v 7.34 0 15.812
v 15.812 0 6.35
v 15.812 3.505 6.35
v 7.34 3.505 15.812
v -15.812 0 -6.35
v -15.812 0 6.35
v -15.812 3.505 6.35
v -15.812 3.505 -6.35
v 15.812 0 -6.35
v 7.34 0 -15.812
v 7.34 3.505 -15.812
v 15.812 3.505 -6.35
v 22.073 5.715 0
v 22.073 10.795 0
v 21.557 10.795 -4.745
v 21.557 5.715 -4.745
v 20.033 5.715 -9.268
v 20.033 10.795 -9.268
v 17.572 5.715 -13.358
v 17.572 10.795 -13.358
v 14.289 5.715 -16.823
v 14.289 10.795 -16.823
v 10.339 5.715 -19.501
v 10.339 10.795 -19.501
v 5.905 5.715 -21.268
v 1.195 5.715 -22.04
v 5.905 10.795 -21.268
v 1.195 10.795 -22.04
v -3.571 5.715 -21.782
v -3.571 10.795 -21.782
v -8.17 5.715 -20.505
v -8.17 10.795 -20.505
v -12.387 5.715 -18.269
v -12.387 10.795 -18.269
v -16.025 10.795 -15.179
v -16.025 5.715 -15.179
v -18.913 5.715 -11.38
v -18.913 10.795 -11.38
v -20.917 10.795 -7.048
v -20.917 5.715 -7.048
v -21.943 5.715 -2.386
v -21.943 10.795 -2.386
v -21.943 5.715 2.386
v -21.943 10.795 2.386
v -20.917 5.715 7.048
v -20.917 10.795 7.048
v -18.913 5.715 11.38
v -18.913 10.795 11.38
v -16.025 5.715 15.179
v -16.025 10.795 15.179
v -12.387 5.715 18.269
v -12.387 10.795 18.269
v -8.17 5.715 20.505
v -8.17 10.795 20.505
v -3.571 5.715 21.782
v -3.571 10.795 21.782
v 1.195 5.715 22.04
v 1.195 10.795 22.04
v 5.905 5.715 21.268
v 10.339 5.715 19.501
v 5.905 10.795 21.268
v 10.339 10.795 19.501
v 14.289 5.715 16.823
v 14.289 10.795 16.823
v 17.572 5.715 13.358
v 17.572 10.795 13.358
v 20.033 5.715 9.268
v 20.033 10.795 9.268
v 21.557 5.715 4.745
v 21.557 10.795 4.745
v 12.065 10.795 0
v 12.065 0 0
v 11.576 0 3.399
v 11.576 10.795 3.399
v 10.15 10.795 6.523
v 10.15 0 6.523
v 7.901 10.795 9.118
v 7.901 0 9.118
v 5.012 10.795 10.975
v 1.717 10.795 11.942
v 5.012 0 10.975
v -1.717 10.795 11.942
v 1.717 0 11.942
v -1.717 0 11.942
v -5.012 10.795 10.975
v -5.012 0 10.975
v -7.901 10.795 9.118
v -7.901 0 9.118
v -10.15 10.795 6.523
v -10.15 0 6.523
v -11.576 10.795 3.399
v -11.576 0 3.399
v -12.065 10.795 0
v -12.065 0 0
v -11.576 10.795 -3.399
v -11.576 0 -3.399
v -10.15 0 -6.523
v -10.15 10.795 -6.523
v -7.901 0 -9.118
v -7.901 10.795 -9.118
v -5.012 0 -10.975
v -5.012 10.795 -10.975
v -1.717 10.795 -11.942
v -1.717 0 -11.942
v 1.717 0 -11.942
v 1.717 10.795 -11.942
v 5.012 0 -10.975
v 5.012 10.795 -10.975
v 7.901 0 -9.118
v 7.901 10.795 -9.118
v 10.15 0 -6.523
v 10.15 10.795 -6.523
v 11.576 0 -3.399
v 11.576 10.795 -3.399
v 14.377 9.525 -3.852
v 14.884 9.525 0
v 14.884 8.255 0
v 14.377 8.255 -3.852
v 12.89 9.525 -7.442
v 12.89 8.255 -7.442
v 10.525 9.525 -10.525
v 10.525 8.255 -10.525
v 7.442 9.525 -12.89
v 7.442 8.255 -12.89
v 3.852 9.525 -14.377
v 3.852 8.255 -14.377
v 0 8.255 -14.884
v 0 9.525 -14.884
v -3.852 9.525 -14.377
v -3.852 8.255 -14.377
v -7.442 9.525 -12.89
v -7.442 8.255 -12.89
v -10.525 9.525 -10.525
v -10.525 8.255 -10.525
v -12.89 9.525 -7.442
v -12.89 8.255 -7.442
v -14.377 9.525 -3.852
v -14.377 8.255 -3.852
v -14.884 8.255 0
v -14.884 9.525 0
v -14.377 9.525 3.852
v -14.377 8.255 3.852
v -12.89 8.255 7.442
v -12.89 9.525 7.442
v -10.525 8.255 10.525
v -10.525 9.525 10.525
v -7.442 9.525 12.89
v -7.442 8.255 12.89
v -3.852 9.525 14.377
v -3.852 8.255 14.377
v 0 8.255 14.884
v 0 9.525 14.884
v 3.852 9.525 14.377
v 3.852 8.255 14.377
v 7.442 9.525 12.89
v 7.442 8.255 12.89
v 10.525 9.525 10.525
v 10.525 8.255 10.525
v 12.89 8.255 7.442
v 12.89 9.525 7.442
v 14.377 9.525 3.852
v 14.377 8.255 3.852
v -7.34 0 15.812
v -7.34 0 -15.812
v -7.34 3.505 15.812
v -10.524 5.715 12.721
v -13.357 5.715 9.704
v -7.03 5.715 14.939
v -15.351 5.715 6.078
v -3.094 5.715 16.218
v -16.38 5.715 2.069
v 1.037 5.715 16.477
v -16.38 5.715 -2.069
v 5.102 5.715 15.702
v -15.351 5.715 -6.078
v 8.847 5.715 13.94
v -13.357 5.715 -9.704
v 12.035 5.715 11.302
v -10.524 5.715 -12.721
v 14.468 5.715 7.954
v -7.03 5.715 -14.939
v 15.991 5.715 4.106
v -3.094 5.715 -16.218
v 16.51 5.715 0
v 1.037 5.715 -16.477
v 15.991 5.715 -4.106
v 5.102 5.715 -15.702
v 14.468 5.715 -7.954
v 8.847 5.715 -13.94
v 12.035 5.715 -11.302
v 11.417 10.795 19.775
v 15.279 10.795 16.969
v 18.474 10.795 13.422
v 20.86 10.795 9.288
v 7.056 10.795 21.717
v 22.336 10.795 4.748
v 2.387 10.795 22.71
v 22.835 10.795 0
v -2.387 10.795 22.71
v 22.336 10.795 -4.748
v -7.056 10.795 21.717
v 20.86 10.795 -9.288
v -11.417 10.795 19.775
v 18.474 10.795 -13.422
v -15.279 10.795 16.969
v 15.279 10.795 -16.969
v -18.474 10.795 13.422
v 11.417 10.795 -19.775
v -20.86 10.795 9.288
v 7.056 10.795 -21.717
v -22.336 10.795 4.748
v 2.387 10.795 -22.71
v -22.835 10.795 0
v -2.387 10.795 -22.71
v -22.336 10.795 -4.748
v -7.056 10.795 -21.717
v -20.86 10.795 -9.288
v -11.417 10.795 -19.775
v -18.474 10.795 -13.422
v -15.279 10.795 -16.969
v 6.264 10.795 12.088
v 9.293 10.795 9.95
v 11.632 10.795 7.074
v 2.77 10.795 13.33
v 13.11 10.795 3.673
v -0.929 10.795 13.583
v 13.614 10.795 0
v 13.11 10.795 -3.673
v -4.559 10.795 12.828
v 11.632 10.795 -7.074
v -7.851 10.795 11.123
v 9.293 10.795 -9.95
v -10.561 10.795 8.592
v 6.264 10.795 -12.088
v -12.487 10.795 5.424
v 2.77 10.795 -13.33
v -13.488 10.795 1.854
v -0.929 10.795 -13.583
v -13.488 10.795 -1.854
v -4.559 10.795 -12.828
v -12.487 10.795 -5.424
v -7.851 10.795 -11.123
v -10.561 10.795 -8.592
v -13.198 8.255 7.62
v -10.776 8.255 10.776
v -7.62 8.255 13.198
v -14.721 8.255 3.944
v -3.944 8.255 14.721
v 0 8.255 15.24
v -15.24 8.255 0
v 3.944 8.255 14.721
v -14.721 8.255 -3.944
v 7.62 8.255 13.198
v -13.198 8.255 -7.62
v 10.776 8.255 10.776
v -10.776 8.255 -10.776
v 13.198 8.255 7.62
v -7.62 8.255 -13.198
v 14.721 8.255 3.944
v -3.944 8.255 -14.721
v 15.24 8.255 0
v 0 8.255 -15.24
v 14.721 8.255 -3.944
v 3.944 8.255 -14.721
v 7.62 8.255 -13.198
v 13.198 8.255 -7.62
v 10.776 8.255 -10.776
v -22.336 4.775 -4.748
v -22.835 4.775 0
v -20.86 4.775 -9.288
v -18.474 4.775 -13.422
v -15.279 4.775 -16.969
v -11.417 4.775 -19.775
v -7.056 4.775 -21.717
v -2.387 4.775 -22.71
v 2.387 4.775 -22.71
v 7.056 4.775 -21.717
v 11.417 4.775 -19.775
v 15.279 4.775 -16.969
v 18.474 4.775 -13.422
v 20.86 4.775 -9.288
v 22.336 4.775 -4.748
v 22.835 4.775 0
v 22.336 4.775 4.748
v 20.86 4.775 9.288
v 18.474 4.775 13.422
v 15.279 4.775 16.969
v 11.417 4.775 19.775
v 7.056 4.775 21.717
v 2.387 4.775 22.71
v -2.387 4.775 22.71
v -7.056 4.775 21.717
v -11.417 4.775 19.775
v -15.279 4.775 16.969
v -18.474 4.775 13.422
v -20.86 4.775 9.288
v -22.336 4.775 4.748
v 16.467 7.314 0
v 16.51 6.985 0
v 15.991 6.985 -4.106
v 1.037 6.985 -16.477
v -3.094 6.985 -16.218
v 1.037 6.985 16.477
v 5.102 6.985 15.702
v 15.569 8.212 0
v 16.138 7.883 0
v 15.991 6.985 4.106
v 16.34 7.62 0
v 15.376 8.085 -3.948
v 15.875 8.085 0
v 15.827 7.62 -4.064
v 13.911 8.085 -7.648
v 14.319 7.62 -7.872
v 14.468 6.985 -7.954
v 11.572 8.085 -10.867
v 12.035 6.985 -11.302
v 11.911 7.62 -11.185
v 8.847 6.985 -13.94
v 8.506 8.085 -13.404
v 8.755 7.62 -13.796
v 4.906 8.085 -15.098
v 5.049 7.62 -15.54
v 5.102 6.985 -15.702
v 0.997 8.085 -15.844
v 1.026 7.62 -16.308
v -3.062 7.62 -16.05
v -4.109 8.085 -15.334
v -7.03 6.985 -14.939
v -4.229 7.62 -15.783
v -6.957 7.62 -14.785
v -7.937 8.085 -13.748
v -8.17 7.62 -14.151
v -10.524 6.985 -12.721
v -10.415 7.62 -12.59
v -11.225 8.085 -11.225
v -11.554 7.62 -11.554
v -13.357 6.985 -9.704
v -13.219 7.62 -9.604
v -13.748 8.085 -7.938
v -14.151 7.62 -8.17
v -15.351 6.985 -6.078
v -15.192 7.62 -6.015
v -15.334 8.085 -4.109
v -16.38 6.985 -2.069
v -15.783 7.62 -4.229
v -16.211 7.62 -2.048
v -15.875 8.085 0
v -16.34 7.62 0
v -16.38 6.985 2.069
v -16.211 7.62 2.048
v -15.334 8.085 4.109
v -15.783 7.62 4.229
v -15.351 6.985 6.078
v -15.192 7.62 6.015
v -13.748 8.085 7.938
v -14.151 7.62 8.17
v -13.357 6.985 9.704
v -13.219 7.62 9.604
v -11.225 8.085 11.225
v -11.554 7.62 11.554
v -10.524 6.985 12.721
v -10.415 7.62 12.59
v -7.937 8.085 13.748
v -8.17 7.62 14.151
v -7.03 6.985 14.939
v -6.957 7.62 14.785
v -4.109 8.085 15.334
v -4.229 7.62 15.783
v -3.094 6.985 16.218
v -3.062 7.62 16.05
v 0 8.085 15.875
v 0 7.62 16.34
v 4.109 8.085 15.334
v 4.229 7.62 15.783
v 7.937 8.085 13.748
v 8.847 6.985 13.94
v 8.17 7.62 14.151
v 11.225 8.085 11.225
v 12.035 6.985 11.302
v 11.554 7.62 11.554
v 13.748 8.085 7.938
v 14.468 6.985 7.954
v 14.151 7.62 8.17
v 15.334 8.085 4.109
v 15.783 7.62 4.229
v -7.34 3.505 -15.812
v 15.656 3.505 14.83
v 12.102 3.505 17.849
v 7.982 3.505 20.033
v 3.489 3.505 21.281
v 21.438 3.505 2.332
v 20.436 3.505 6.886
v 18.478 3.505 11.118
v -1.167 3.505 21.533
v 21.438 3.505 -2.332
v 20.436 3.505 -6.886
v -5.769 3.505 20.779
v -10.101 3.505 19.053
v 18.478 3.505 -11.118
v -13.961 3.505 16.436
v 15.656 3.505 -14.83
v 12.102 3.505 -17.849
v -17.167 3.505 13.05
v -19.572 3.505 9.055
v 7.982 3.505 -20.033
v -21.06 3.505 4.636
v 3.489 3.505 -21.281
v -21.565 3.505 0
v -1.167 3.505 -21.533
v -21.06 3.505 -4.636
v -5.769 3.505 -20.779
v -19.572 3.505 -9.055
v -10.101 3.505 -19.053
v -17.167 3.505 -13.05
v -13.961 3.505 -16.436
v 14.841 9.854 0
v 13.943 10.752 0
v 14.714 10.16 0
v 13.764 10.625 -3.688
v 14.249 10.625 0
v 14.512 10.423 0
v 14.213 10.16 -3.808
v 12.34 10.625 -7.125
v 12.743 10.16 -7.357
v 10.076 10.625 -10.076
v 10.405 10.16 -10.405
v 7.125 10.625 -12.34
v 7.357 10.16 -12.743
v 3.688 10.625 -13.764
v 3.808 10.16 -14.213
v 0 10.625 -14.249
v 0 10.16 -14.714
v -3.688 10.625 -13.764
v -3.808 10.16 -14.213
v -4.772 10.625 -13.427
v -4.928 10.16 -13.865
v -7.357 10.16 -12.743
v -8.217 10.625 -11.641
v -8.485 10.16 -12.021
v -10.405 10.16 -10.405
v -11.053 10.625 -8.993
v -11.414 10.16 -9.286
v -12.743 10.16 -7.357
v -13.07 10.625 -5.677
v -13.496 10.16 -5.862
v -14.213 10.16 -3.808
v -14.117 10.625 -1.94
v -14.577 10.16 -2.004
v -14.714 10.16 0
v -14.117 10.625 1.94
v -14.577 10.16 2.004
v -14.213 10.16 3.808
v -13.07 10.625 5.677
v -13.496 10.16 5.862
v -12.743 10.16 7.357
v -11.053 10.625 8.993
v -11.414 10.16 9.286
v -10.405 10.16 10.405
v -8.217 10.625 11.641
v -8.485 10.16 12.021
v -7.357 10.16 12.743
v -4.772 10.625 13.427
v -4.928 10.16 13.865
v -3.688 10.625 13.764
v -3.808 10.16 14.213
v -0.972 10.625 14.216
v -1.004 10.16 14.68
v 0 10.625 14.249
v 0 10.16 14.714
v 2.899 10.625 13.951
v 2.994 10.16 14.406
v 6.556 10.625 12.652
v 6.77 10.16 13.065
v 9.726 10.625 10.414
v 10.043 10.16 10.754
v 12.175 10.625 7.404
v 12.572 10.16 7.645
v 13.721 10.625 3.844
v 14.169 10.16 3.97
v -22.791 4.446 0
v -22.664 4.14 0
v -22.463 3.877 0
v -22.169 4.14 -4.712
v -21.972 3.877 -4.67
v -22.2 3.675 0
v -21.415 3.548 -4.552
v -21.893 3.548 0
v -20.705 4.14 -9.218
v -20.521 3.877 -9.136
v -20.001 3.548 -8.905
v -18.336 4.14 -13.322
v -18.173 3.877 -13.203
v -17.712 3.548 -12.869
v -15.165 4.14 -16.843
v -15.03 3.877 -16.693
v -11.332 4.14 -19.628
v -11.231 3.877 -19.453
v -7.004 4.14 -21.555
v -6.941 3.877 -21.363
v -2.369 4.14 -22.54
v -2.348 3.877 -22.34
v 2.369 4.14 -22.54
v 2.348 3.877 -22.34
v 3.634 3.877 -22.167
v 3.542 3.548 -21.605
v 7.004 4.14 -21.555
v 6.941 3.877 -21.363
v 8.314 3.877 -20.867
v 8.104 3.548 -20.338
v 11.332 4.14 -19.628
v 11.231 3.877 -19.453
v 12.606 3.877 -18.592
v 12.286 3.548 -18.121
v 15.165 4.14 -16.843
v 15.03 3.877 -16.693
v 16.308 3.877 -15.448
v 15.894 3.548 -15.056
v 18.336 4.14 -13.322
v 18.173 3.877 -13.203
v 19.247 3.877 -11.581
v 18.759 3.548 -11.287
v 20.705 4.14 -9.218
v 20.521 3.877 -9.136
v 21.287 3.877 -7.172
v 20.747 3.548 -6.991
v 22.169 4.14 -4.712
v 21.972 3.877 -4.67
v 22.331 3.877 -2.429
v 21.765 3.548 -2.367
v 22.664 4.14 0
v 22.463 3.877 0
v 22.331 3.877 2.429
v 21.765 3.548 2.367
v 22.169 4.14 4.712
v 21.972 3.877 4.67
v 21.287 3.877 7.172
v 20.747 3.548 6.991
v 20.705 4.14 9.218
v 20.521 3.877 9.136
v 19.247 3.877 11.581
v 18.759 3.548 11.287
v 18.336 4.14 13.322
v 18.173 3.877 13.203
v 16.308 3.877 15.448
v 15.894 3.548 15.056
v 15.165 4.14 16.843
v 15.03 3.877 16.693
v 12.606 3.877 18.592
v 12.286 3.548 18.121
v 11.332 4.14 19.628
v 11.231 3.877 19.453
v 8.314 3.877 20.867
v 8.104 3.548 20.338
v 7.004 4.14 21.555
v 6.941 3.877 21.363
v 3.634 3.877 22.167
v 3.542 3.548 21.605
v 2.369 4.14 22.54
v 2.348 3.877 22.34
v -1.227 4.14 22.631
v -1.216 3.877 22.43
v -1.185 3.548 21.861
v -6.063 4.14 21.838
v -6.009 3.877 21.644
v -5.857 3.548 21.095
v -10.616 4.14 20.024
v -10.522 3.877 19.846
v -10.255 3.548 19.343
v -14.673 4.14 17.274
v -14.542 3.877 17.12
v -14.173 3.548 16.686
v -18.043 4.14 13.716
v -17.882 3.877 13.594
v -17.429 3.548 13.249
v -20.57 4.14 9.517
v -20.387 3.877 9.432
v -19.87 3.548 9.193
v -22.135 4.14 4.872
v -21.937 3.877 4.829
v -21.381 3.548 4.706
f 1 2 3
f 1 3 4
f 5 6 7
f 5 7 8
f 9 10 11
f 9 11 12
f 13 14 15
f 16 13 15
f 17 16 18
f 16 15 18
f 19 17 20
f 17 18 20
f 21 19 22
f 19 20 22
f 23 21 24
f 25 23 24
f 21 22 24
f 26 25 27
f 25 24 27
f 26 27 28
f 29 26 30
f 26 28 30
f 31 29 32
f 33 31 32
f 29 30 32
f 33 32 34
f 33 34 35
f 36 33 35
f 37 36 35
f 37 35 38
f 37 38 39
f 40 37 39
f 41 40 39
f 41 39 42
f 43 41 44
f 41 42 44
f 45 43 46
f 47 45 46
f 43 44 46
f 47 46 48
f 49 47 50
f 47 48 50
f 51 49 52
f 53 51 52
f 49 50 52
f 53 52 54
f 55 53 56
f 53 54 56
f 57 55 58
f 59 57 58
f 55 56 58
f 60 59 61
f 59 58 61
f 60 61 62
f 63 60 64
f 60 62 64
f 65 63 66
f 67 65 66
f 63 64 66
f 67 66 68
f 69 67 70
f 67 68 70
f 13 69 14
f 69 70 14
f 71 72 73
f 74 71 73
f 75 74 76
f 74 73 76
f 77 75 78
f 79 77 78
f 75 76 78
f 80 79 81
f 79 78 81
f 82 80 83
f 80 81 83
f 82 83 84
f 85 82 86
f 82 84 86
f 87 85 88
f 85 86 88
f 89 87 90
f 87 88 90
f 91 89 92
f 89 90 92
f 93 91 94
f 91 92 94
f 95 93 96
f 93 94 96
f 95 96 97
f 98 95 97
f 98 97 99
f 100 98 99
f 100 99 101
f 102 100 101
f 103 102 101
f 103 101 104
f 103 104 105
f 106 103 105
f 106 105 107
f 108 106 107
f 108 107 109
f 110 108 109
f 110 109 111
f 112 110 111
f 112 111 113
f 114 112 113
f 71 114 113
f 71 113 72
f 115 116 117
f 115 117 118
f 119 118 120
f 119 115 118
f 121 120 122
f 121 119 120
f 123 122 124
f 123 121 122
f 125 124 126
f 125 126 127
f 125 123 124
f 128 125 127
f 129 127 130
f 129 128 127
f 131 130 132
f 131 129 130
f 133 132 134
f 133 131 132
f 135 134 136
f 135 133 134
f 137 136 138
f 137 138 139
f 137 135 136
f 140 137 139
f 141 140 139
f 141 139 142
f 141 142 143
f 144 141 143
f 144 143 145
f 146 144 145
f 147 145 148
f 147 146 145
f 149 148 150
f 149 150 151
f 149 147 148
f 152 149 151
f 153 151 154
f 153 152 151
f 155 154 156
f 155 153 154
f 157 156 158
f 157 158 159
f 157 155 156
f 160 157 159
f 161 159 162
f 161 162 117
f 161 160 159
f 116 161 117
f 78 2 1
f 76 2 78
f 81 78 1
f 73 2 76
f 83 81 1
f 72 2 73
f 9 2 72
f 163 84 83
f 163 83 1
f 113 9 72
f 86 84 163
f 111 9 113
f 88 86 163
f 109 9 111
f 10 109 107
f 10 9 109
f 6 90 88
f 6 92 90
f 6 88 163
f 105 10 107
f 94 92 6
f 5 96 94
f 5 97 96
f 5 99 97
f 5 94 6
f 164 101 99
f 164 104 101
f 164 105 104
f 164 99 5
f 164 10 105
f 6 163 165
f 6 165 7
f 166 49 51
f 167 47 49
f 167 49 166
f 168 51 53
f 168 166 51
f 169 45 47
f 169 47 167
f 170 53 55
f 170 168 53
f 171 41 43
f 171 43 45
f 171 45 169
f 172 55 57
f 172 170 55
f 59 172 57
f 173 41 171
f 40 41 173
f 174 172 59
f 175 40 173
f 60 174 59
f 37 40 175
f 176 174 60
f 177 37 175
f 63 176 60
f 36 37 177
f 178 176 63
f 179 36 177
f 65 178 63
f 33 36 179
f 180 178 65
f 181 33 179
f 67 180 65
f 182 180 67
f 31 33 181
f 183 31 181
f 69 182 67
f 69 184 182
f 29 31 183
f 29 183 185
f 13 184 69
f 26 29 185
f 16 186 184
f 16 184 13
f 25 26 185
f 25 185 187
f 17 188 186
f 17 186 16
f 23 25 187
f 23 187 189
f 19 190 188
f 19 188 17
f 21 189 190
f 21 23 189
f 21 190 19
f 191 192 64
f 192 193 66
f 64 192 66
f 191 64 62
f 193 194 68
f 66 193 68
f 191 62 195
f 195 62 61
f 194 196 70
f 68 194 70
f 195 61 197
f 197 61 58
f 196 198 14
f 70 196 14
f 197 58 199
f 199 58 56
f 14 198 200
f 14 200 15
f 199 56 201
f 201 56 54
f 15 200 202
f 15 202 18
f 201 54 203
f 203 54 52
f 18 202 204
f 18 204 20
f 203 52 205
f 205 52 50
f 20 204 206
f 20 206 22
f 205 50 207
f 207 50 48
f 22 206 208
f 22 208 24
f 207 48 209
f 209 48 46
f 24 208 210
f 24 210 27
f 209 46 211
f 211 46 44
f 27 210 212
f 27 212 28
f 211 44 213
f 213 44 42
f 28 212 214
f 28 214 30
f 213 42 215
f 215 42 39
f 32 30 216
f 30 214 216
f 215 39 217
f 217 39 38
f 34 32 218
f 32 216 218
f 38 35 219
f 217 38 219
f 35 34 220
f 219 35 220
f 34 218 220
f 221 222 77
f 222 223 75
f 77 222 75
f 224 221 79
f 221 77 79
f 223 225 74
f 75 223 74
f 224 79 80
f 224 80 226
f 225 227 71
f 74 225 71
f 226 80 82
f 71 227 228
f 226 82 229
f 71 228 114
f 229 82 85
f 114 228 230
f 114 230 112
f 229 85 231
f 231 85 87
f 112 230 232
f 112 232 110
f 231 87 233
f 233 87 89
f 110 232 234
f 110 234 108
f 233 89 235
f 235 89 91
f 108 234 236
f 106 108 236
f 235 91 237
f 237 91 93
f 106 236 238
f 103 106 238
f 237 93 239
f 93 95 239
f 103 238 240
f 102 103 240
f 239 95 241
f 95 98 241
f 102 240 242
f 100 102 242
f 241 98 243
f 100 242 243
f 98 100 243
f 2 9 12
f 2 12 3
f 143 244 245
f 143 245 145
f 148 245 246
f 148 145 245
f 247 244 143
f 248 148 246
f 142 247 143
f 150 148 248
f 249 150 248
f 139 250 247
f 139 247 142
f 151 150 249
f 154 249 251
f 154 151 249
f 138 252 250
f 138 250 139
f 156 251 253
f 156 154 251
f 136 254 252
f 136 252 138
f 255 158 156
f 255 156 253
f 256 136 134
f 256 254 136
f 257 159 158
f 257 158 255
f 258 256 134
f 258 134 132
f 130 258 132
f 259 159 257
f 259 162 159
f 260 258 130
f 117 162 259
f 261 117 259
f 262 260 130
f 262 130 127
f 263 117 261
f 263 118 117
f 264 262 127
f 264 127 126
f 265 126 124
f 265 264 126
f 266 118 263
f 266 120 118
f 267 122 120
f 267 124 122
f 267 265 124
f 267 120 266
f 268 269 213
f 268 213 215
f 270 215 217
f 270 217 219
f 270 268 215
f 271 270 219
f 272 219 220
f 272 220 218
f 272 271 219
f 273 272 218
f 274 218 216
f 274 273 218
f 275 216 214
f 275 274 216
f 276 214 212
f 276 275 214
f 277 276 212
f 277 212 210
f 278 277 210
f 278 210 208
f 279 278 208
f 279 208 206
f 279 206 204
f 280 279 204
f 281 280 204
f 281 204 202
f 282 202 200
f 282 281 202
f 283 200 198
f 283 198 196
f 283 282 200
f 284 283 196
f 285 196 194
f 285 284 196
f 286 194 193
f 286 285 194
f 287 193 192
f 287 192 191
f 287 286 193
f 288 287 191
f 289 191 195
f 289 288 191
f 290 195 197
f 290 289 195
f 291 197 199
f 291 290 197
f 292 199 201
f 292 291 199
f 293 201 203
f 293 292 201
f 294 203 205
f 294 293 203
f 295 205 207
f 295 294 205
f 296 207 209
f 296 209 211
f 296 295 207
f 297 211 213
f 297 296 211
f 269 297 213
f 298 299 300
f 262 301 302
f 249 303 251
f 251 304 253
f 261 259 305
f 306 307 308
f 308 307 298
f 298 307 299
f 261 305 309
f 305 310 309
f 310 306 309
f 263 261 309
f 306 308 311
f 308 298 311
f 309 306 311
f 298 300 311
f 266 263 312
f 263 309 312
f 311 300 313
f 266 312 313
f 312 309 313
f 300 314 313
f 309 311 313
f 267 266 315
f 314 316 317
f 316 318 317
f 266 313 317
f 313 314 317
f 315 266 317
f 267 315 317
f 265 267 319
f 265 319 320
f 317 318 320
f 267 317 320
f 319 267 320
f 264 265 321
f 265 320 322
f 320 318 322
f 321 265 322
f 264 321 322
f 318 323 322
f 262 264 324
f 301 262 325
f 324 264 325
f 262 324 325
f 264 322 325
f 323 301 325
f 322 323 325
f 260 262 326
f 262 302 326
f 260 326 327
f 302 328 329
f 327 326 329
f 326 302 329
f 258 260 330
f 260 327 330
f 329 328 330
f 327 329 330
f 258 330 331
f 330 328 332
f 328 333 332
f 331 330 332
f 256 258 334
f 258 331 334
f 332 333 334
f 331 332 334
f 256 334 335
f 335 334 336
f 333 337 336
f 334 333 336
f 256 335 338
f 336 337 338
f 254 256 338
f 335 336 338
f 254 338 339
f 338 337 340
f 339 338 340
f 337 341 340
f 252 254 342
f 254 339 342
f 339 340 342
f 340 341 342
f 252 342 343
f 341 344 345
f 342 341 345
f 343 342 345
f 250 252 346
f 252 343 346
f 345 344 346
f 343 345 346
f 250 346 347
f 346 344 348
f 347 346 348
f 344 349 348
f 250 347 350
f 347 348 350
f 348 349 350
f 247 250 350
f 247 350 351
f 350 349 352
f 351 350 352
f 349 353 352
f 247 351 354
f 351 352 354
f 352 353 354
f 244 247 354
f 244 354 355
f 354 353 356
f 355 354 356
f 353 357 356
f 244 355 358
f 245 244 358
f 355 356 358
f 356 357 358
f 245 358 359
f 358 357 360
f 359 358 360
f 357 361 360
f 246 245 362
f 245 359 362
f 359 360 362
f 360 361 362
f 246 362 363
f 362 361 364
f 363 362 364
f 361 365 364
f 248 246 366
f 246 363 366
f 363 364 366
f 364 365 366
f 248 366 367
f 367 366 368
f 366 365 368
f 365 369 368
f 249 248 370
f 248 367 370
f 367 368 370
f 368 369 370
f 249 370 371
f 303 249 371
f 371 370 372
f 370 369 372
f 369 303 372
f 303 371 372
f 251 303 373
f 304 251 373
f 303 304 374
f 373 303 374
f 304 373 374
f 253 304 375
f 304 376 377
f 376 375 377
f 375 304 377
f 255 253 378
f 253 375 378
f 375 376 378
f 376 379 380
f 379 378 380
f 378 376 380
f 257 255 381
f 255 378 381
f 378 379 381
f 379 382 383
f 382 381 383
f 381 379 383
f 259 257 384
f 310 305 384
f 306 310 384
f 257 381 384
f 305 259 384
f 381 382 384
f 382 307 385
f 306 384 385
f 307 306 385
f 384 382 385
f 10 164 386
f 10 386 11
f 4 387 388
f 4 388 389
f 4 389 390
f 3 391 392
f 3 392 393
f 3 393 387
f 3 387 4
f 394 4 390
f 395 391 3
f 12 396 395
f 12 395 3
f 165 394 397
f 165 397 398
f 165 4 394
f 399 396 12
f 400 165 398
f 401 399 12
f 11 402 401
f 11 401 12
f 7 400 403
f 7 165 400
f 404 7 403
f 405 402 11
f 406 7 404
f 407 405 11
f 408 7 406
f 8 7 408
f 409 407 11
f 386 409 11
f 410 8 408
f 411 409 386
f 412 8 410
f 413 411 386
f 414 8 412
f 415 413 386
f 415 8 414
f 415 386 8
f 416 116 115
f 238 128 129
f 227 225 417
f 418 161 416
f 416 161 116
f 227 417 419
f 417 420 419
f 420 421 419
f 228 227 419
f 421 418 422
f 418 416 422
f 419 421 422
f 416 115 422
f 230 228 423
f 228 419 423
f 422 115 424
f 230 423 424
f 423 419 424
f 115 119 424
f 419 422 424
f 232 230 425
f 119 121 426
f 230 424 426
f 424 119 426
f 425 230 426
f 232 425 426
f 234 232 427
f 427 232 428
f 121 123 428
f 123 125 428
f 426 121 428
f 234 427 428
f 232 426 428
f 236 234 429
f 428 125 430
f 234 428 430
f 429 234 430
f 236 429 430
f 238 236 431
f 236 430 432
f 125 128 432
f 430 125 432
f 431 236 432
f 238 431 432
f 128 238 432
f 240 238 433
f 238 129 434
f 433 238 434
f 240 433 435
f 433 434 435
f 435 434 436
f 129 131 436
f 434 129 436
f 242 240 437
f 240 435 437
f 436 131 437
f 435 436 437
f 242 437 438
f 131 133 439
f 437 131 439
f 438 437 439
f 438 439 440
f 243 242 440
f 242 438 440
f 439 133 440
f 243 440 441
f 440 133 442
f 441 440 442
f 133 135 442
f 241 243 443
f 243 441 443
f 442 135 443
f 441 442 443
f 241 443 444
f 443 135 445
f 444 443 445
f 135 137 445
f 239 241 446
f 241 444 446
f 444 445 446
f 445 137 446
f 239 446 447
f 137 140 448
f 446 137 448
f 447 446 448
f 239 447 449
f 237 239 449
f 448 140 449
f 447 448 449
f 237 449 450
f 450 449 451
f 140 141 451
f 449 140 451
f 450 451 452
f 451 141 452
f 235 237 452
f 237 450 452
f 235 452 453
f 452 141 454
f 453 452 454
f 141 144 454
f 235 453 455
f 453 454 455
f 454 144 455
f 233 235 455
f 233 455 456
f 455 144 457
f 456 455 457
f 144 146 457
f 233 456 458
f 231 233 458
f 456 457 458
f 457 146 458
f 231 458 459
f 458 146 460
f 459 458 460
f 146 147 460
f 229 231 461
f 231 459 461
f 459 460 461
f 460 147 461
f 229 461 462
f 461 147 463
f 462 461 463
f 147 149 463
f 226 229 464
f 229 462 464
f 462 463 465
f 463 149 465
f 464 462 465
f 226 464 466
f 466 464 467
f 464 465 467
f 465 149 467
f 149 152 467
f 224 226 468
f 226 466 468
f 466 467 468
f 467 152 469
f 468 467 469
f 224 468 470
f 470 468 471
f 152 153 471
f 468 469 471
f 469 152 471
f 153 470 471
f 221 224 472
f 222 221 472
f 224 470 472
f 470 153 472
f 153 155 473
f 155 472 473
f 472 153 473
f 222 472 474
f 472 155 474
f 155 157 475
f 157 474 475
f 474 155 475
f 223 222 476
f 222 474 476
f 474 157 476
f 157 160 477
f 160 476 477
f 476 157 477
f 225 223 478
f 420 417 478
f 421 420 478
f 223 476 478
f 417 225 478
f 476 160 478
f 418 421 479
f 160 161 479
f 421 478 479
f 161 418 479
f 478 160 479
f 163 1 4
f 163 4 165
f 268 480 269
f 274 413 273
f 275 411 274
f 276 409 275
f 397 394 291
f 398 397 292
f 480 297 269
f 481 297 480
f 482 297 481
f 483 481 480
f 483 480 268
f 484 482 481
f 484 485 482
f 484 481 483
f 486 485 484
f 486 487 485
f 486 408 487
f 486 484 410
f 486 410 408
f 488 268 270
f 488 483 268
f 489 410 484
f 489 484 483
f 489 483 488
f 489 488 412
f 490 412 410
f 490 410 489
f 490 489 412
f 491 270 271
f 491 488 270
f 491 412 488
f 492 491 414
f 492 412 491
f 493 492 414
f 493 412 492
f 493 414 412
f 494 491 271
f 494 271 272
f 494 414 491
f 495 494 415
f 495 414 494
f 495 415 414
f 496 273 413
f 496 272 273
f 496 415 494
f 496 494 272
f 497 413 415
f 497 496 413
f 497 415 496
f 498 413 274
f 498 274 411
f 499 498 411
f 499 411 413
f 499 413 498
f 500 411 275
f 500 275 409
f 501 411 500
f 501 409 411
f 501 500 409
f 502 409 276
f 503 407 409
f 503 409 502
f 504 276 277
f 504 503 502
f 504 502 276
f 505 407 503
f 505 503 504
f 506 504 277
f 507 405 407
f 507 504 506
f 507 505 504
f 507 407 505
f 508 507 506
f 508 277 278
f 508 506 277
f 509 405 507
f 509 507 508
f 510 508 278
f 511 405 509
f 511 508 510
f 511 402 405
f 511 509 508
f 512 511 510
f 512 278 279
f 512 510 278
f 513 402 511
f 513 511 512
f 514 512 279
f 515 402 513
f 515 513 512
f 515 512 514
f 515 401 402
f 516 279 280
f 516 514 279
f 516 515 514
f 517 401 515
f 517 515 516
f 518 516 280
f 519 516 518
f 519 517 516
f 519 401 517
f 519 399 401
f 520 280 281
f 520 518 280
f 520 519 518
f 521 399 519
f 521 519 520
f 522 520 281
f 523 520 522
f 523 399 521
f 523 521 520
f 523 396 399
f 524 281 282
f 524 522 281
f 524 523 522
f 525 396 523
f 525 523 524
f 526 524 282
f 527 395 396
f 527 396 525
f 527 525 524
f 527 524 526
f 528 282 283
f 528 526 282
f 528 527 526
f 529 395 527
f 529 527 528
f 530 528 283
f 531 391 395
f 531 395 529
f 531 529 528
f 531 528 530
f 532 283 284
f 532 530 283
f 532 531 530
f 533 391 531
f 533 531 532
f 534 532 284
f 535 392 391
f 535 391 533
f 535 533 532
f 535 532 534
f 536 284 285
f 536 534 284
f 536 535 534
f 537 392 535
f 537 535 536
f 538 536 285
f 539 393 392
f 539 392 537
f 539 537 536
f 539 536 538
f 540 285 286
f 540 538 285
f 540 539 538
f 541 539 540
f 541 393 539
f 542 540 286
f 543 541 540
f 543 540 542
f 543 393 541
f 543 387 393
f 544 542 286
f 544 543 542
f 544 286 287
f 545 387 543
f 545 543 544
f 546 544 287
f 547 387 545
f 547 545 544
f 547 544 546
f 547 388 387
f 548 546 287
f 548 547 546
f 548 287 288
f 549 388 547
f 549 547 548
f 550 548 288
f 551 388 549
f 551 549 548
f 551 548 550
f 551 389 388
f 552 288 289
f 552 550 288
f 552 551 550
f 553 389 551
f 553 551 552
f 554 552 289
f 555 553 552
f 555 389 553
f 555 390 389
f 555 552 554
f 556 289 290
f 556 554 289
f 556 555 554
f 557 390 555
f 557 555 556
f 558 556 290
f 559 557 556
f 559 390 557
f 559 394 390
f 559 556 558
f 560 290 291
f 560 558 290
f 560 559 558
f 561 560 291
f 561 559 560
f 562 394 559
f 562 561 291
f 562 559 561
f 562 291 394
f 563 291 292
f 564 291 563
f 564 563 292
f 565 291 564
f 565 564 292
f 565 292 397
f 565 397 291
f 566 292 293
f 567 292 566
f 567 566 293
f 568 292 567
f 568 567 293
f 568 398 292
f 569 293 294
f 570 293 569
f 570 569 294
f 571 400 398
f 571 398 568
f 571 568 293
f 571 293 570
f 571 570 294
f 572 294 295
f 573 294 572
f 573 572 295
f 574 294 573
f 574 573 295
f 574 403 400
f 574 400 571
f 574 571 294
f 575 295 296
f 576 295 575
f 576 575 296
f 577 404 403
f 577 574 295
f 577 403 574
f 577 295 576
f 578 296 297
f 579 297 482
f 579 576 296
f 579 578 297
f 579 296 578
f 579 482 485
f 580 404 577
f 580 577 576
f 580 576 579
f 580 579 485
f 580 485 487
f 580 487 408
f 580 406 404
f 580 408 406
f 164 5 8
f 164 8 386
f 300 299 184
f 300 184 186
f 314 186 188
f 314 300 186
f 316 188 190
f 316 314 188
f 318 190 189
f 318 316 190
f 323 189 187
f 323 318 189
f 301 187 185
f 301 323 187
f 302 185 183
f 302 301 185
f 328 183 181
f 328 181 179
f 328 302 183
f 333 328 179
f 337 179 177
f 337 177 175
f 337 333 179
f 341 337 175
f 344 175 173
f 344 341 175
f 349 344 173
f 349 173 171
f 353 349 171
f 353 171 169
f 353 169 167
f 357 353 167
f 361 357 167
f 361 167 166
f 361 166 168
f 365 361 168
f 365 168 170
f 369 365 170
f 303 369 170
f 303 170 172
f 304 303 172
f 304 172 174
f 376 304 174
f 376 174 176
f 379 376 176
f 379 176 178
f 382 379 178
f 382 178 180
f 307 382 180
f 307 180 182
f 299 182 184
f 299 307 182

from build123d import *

# Parameters (mm, degrees)
BOSS_EXTRUDE1_DEPTH = 10.795
SKETCH2_R           = 22.8346
BOSS_EXTRUDE2_DEPTH = 7.2898
SKETCH3_R           = 22.0726
SKETCH3_R_2         = 16.51
CUT_EXTRUDE1_DEPTH  = 5.08
SKETCH4_R           = 12.065
CUT_EXTRUDE2_DEPTH  = 11.795
SKETCH5_R           = 18.1356
SKETCH5_R_2         = 14.8844
CUT_EXTRUDE5_DEPTH  = 2.54
FILLET1_R           = 1.27
FILLET2_R           = 1.27
FILLET3_R           = 1.27


with BuildPart() as part:
    # Sketch1 → Boss-Extrude1 (new body)
    with BuildSketch(Plane(origin=(0, 0, 0), x_dir=(1, 0, 0), z_dir=(0, 1, 0))):
        Polygon((-7.339781299, 15.8115), (7.339781299, 15.8115), (15.8115, 6.35), (15.8115, -6.35), (7.339781299, -15.8115), (-7.339781299, -15.8115), (-15.8115, -6.35), (-15.8115, 6.35), align=None)
    extrude(amount=BOSS_EXTRUDE1_DEPTH)

    # Sketch2 → Boss-Extrude2 (add)
    with BuildSketch(Plane(origin=(0, 3.5052, 0), x_dir=(-1, 0, 0), z_dir=(0, -1, 0))):
        Circle(SKETCH2_R)
    extrude(amount=-BOSS_EXTRUDE2_DEPTH)

    # Sketch3 → Cut-Extrude1 (cut)
    with BuildSketch(Plane(origin=(0, 10.795, 0), x_dir=(1, 0, 0), z_dir=(0, 1, 0))):
        Circle(SKETCH3_R)
        Circle(SKETCH3_R_2, mode=Mode.SUBTRACT)
    extrude(amount=-CUT_EXTRUDE1_DEPTH, mode=Mode.SUBTRACT)

    # Sketch4 → Cut-Extrude2 (cut, through all)
    with BuildSketch(Plane.XZ):
        Circle(SKETCH4_R)
    extrude(amount=-CUT_EXTRUDE2_DEPTH, mode=Mode.SUBTRACT)

    # Sketch5 → Cut-Extrude5 (cut)
    with BuildSketch(Plane(origin=(0, 10.795, 0), x_dir=(1, 0, 0), z_dir=(0, 1, 0))):
        Circle(SKETCH5_R)
        Circle(SKETCH5_R_2, mode=Mode.SUBTRACT)
    extrude(amount=-CUT_EXTRUDE5_DEPTH, mode=Mode.SUBTRACT)

    # Fillet1
    fillet1_edges = [part.edges().sort_by_distance(p)[0] for p in [
        (-14.8844, 10.795, 0),
    ]]
    fillet(fillet1_edges, radius=FILLET1_R)

    # Fillet2
    fillet2_edges = [part.edges().sort_by_distance(p)[0] for p in [
        (-16.51, 8.255, 0),
    ]]
    fillet(fillet2_edges, radius=FILLET2_R)

    # Fillet3
    fillet3_edges = [part.edges().sort_by_distance(p)[0] for p in [
        (22.8346, 3.5052, 0),
    ]]
    fillet(fillet3_edges, radius=FILLET3_R)


solid = part.part
